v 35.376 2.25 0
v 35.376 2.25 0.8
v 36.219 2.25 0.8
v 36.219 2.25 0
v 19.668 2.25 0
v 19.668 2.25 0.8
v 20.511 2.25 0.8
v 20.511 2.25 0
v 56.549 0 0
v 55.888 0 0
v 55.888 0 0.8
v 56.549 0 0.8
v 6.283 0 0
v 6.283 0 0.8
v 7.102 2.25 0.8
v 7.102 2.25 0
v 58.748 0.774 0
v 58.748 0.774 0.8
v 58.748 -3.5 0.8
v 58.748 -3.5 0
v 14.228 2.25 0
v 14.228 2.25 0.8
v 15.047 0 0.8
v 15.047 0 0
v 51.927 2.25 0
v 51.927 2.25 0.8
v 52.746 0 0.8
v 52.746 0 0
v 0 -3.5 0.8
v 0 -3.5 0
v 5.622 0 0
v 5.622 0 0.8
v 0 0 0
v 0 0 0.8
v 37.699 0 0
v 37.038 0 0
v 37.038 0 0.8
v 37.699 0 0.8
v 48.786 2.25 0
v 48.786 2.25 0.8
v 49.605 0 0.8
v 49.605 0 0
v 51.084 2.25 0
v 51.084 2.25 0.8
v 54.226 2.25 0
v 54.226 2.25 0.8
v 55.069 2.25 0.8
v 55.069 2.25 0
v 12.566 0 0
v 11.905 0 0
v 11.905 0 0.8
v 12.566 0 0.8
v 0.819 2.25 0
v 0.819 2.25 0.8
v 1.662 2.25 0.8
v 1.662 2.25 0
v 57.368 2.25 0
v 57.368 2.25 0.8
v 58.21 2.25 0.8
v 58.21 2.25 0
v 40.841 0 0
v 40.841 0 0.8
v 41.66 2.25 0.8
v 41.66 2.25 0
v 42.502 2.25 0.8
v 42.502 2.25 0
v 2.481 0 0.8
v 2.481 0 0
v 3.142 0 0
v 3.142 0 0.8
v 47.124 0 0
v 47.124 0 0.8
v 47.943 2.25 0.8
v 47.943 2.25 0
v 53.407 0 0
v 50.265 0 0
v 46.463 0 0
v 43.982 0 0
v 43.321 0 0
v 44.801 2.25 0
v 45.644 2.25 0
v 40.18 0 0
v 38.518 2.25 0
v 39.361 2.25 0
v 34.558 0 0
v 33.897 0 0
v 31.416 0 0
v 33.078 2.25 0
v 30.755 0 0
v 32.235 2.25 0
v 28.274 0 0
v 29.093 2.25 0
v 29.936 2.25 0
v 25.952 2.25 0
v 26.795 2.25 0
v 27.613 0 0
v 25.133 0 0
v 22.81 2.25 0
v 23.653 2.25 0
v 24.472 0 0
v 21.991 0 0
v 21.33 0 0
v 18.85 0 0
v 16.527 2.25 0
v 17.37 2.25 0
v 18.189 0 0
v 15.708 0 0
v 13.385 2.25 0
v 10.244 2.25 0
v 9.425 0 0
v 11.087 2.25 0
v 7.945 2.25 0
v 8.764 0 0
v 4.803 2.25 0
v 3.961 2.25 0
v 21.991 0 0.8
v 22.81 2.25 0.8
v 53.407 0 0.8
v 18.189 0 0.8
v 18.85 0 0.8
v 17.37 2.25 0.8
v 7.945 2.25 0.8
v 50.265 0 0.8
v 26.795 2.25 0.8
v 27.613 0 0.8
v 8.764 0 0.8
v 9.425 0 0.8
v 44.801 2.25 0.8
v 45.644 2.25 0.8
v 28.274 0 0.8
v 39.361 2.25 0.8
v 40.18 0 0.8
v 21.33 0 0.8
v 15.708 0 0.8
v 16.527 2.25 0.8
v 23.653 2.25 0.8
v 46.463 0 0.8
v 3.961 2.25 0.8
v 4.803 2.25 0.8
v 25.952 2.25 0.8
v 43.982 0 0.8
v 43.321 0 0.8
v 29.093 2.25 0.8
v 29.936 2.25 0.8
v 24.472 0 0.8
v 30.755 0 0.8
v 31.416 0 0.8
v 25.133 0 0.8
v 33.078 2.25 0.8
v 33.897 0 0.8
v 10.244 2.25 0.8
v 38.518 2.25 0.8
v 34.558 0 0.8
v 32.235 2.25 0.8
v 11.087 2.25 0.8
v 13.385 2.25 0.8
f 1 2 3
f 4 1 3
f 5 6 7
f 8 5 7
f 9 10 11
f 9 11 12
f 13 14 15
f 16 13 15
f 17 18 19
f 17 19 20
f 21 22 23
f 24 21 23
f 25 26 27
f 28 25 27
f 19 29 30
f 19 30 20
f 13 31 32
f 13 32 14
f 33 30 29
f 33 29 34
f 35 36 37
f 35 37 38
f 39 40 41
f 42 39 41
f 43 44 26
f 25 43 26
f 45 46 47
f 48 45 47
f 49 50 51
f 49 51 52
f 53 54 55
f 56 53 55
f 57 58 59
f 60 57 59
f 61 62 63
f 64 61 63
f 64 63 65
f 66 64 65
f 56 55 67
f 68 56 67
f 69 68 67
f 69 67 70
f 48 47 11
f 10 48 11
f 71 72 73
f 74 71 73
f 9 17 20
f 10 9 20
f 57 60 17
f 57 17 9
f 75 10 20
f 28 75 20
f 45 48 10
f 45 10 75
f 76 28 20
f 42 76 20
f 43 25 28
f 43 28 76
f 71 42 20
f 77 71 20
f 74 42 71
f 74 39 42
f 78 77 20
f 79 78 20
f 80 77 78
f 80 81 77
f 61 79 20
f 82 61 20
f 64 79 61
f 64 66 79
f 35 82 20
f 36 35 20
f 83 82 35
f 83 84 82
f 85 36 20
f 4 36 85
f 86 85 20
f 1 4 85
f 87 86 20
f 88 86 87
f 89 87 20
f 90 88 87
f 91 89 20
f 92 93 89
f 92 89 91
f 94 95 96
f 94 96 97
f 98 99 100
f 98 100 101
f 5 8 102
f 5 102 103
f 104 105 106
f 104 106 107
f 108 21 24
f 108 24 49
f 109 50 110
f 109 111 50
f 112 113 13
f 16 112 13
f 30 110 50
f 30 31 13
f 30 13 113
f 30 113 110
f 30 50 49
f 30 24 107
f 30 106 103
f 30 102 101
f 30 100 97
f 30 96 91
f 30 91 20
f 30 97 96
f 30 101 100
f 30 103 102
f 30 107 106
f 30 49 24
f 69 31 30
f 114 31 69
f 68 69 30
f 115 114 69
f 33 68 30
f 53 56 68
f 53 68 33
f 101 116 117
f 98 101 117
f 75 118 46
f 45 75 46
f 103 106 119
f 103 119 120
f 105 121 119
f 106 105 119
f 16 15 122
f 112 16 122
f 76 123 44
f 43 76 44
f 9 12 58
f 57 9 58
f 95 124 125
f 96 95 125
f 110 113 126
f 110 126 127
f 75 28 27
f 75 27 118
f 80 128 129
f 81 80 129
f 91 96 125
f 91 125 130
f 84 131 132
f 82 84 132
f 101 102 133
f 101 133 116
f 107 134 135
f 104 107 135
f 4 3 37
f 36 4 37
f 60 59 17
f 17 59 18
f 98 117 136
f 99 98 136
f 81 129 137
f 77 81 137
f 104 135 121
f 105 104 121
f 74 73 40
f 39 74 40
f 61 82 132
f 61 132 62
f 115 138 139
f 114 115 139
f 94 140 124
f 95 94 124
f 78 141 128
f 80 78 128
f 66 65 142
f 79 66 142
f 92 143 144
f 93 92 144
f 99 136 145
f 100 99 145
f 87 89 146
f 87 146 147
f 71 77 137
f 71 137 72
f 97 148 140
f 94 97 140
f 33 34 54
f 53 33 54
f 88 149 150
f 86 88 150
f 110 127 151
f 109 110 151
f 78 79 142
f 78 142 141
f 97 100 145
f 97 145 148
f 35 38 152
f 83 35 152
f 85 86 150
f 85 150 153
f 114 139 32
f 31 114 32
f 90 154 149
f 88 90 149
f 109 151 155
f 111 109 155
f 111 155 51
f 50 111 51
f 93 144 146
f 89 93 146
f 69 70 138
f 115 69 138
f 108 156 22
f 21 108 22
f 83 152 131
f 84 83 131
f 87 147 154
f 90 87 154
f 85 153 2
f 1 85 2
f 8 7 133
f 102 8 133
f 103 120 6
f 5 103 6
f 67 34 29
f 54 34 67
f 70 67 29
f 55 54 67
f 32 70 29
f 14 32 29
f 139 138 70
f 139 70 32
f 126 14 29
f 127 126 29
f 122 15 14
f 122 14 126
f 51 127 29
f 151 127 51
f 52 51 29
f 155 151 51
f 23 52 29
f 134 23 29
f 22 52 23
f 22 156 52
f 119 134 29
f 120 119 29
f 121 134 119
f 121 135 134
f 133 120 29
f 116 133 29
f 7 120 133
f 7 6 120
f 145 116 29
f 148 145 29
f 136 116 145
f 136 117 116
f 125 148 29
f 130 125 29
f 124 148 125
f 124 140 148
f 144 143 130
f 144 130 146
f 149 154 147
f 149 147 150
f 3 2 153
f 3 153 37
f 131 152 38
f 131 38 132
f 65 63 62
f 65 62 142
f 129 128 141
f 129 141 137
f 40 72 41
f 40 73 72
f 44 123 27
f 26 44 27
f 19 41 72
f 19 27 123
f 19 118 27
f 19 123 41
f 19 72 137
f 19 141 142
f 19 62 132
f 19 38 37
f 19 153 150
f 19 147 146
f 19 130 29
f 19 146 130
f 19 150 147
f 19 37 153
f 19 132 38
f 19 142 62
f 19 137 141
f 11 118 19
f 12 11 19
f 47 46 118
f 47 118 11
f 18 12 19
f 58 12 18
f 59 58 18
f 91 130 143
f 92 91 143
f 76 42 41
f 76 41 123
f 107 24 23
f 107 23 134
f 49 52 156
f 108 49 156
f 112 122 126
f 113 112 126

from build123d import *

# Parameters (mm, degrees)
SKETCH_1_W             = 94.247779608
SKETCH_1_H             = 10
EXTRUDE_1_DEPTH        = 30
EXTRUDE_2_DEPTH        = 30
PATTERN_LINEAR_1_COUNT = 30
PATTERN_LINEAR_1_PITCH = 3.141592654
SKETCH_3_W             = 127.719495272
SKETCH_3_H             = 47.772940979
CUT_EXTRUDE_1_DEPTH    = 29.2
SKETCH_4_W             = 116.864963103
SKETCH_4_H             = 41.403215516
CUT_EXTRUDE_2_DEPTH    = 6.5
SKETCH_5_W             = 7.796889188
SKETCH_5_H             = 8.147498767
CUT_EXTRUDE_3_DEPTH    = 35.5


with BuildPart() as part:
    # 草图1 → 拉伸1 (new body)
    with BuildSketch(Plane.XY):
        with Locations((47.123889804, -5)):
            Rectangle(SKETCH_1_W, SKETCH_1_H)
    extrude(amount=EXTRUDE_1_DEPTH)

    # 草图2 → 拉伸2 (add)
    with BuildSketch(Plane.XY.offset(30)):
        Polygon((0, 0), (0.818933027, 2.25), (1.661788885, 2.25), (2.480721912, 0), align=None)
    extrude_2 = extrude(amount=-EXTRUDE_2_DEPTH)

    # 阵列(线性)1: 拉伸2 ×30
    with Locations(*[(i * PATTERN_LINEAR_1_PITCH, 0, 0) for i in range(1, PATTERN_LINEAR_1_COUNT)]):
        add(extrude_2)

    # 草图3 → 切除-拉伸1 (cut)
    with BuildSketch(Plane.XY.offset(30)):
        with Locations((51.771189505, -6.332442571)):
            Rectangle(SKETCH_3_W, SKETCH_3_H)
    extrude(amount=-CUT_EXTRUDE_1_DEPTH, mode=Mode.SUBTRACT)

    # 草图4 → 切除-拉伸2 (cut)
    with BuildSketch(Plane.XZ.offset(10)):
        with Locations((50.698735728, -1.072453777)):
            Rectangle(SKETCH_4_W, SKETCH_4_H)
    extrude(amount=-CUT_EXTRUDE_2_DEPTH, mode=Mode.SUBTRACT)

    # 草图5 → 切除-拉伸3 (cut)
    with BuildSketch(Plane(origin=(94.247779608, 0, 0), x_dir=(0, 0, -1), z_dir=(1, 0, 0))):
        with Locations((-0.132848354, -1.658756065)):
            Rectangle(SKETCH_5_W, SKETCH_5_H)
    extrude(amount=-CUT_EXTRUDE_3_DEPTH, mode=Mode.SUBTRACT)


solid = part.part
